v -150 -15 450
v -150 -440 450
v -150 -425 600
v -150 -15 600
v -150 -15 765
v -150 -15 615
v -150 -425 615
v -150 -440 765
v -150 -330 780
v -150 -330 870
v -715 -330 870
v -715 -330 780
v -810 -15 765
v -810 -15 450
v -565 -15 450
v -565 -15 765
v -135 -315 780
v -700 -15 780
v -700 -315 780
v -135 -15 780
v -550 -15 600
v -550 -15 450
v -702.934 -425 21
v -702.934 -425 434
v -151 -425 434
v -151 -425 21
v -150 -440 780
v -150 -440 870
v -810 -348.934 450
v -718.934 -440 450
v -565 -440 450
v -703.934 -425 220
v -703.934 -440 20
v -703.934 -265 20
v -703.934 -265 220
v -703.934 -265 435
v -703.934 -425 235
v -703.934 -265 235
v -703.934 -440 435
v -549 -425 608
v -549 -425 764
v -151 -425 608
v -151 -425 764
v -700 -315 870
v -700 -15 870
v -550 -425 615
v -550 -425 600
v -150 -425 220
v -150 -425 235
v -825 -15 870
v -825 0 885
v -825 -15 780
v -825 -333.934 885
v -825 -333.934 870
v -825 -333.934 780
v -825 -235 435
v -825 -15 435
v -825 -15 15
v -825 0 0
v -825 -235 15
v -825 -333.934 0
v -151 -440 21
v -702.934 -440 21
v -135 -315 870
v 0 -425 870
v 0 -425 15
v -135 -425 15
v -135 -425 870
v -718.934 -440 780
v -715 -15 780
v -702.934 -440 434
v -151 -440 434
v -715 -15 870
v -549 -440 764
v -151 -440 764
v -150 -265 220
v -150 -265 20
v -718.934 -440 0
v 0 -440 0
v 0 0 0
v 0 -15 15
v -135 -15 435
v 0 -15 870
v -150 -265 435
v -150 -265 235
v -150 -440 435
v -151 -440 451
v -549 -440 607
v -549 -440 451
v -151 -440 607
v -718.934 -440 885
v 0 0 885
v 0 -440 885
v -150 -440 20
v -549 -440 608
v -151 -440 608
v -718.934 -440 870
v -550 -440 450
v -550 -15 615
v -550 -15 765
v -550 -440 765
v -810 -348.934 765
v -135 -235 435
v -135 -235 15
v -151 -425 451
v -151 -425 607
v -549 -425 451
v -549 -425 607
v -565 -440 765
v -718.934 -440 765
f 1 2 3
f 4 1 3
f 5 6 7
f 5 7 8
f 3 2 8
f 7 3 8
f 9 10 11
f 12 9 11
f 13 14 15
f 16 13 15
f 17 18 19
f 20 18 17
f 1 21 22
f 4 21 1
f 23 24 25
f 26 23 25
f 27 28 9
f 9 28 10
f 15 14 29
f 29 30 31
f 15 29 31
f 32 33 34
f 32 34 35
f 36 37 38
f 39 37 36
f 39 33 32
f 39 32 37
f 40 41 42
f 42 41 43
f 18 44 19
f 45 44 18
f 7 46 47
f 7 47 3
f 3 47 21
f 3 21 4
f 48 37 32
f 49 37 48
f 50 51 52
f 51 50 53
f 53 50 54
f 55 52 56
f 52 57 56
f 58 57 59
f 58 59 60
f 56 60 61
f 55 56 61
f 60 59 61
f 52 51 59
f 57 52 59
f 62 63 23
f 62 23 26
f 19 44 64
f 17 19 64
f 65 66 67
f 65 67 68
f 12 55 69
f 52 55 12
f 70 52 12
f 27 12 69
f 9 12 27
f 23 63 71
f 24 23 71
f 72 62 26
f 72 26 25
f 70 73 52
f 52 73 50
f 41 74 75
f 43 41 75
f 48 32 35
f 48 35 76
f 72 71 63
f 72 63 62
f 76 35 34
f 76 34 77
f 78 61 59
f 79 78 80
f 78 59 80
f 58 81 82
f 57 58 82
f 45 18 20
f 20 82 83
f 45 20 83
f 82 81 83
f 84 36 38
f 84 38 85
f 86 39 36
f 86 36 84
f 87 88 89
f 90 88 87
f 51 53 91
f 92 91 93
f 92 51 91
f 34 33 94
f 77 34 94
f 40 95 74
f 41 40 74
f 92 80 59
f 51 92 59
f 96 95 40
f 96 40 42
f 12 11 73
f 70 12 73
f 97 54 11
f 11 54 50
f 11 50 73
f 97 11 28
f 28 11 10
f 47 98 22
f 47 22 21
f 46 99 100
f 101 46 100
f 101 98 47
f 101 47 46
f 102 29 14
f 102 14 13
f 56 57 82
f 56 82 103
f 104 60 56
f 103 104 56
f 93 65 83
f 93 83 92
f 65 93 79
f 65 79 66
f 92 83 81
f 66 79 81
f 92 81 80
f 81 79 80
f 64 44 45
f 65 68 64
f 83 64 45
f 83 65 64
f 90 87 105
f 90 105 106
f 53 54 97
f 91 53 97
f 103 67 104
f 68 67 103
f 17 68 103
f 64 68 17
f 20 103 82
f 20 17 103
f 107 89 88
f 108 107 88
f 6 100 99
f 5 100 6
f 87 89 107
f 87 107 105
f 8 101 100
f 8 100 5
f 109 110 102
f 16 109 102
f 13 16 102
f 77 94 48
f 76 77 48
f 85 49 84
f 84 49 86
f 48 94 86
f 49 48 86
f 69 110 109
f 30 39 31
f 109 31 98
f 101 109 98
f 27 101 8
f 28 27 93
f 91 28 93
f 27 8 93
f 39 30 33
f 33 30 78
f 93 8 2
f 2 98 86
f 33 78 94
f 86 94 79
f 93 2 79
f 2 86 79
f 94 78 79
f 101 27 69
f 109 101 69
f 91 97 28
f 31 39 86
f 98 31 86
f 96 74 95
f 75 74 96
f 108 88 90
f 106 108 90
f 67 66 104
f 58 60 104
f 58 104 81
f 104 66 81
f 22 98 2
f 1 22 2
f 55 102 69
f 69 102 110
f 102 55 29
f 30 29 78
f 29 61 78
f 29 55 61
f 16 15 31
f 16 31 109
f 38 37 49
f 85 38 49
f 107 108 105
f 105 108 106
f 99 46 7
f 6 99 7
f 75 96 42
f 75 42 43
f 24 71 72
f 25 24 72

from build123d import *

# Parameters (mm, degrees)
F1_DEPTH  = 885
F2_W      = 220
F2_H      = 420
F3_DEPTH  = 800
F4_W      = 400
F4_H      = 150
F4_W_2    = 153.933982822
F4_H_2    = 315
F4_W_3    = 91.066017178
F5_DEPTH  = 425
F6_W      = 553.933982822
F6_H      = 200
F7_DEPTH  = 175
F9_W      = 685
F9_H      = 300
F10_DEPTH = 90
F11_W     = 400
F11_H     = 15
F11_W_2   = 553.933982822
F12_DEPTH = 15
F13_W     = 398
F13_H     = 156
F14_DEPTH = 15
F13_W_2   = 551.933982822
F13_H_2   = 413
F15_W     = 410
F15_H     = 855
F16_DEPTH = 135


with BuildPart() as f1:
    # F0 (on Top) → F1 (new body)
    with BuildSketch(Plane.XY):
        Polygon((0, -440), (0, 0), (-825, 0), (-825, -333.933982822), (-718.933982822, -440), align=None)
    extrude(amount=F1_DEPTH)

    # F2 (on face) → F3 (cut)
    with BuildSketch(Plane(origin=(-825, 0, 0), x_dir=(0, -1, 0), z_dir=(-1, 0, 0))):
        with Locations((125, 225)):
            Rectangle(F2_W, F2_H)
    extrude(amount=-F3_DEPTH, mode=Mode.SUBTRACT)

    # F4 (on face) → F5 (cut)
    with BuildSketch(Plane.XZ.offset(440)):
        with Locations((-350, 690)):
            Rectangle(F4_W, F4_H)
        with Locations((-350, 525)):
            Rectangle(F4_W, F4_H)
        with Locations((-641.966991411, 607.5)):
            Rectangle(F4_W_2, F4_H_2)
        with Locations((-764.466991411, 607.5)):
            Rectangle(F4_W_3, F4_H_2)
    extrude(amount=-F5_DEPTH, mode=Mode.SUBTRACT)

    # F6 (on face) → F7 (cut)
    with BuildSketch(Plane.XZ.offset(440)):
        with Locations((-426.966991411, 335)):
            Rectangle(F6_W, F6_H)
        with Locations((-426.966991411, 120)):
            Rectangle(F6_W, F6_H)
    extrude(amount=-F7_DEPTH, mode=Mode.SUBTRACT)

    # F9 (on offset) → F10 (cut)
    with BuildSketch(Plane.XY.offset(870)):
        Polygon((-150, -440), (-150, -330), (-715, -330), (-715, -15), (-825, -15), (-825, -440), align=None)
        with Locations((-357.5, -165)):
            Rectangle(F9_W, F9_H)
    extrude(amount=-F10_DEPTH, mode=Mode.SUBTRACT)

    # F11 (on face) → F12 (cut)
    with BuildSketch(Plane.XZ.offset(440)):
        with Locations((-350, 607.5)):
            Rectangle(F11_W, F11_H)
        with Locations((-426.966991411, 227.5)):
            Rectangle(F11_W_2, F11_H)
    extrude(amount=-F12_DEPTH, mode=Mode.SUBTRACT)

    # F15 (on face) → F16 (cut)
    with BuildSketch(Plane.YZ):
        with Locations((-220, 442.5)):
            Rectangle(F15_W, F15_H)
    extrude(amount=-F16_DEPTH, mode=Mode.SUBTRACT)


with BuildPart() as f14:
    # F13 (on face) → F14 (new body)
    with BuildSketch(Plane.XZ.offset(440)):
        with Locations((-350, 686)):
            Rectangle(F13_W, F13_H)
    extrude(amount=-F14_DEPTH)


with BuildPart() as f14b:
    # F13 (on face) → F14, piece 2 (new body)
    with BuildSketch(Plane.XZ.offset(440)):
        with Locations((-350, 529)):
            Rectangle(F13_W, F13_H)
    extrude(amount=-F14_DEPTH)


with BuildPart() as f14c:
    # F13 (on face) → F14, piece 3 (new body)
    with BuildSketch(Plane.XZ.offset(440)):
        with Locations((-426.966991411, 227.5)):
            Rectangle(F13_W_2, F13_H_2)
    extrude(amount=-F14_DEPTH)


solid = Compound([f1.part, f14.part, f14b.part, f14c.part])
